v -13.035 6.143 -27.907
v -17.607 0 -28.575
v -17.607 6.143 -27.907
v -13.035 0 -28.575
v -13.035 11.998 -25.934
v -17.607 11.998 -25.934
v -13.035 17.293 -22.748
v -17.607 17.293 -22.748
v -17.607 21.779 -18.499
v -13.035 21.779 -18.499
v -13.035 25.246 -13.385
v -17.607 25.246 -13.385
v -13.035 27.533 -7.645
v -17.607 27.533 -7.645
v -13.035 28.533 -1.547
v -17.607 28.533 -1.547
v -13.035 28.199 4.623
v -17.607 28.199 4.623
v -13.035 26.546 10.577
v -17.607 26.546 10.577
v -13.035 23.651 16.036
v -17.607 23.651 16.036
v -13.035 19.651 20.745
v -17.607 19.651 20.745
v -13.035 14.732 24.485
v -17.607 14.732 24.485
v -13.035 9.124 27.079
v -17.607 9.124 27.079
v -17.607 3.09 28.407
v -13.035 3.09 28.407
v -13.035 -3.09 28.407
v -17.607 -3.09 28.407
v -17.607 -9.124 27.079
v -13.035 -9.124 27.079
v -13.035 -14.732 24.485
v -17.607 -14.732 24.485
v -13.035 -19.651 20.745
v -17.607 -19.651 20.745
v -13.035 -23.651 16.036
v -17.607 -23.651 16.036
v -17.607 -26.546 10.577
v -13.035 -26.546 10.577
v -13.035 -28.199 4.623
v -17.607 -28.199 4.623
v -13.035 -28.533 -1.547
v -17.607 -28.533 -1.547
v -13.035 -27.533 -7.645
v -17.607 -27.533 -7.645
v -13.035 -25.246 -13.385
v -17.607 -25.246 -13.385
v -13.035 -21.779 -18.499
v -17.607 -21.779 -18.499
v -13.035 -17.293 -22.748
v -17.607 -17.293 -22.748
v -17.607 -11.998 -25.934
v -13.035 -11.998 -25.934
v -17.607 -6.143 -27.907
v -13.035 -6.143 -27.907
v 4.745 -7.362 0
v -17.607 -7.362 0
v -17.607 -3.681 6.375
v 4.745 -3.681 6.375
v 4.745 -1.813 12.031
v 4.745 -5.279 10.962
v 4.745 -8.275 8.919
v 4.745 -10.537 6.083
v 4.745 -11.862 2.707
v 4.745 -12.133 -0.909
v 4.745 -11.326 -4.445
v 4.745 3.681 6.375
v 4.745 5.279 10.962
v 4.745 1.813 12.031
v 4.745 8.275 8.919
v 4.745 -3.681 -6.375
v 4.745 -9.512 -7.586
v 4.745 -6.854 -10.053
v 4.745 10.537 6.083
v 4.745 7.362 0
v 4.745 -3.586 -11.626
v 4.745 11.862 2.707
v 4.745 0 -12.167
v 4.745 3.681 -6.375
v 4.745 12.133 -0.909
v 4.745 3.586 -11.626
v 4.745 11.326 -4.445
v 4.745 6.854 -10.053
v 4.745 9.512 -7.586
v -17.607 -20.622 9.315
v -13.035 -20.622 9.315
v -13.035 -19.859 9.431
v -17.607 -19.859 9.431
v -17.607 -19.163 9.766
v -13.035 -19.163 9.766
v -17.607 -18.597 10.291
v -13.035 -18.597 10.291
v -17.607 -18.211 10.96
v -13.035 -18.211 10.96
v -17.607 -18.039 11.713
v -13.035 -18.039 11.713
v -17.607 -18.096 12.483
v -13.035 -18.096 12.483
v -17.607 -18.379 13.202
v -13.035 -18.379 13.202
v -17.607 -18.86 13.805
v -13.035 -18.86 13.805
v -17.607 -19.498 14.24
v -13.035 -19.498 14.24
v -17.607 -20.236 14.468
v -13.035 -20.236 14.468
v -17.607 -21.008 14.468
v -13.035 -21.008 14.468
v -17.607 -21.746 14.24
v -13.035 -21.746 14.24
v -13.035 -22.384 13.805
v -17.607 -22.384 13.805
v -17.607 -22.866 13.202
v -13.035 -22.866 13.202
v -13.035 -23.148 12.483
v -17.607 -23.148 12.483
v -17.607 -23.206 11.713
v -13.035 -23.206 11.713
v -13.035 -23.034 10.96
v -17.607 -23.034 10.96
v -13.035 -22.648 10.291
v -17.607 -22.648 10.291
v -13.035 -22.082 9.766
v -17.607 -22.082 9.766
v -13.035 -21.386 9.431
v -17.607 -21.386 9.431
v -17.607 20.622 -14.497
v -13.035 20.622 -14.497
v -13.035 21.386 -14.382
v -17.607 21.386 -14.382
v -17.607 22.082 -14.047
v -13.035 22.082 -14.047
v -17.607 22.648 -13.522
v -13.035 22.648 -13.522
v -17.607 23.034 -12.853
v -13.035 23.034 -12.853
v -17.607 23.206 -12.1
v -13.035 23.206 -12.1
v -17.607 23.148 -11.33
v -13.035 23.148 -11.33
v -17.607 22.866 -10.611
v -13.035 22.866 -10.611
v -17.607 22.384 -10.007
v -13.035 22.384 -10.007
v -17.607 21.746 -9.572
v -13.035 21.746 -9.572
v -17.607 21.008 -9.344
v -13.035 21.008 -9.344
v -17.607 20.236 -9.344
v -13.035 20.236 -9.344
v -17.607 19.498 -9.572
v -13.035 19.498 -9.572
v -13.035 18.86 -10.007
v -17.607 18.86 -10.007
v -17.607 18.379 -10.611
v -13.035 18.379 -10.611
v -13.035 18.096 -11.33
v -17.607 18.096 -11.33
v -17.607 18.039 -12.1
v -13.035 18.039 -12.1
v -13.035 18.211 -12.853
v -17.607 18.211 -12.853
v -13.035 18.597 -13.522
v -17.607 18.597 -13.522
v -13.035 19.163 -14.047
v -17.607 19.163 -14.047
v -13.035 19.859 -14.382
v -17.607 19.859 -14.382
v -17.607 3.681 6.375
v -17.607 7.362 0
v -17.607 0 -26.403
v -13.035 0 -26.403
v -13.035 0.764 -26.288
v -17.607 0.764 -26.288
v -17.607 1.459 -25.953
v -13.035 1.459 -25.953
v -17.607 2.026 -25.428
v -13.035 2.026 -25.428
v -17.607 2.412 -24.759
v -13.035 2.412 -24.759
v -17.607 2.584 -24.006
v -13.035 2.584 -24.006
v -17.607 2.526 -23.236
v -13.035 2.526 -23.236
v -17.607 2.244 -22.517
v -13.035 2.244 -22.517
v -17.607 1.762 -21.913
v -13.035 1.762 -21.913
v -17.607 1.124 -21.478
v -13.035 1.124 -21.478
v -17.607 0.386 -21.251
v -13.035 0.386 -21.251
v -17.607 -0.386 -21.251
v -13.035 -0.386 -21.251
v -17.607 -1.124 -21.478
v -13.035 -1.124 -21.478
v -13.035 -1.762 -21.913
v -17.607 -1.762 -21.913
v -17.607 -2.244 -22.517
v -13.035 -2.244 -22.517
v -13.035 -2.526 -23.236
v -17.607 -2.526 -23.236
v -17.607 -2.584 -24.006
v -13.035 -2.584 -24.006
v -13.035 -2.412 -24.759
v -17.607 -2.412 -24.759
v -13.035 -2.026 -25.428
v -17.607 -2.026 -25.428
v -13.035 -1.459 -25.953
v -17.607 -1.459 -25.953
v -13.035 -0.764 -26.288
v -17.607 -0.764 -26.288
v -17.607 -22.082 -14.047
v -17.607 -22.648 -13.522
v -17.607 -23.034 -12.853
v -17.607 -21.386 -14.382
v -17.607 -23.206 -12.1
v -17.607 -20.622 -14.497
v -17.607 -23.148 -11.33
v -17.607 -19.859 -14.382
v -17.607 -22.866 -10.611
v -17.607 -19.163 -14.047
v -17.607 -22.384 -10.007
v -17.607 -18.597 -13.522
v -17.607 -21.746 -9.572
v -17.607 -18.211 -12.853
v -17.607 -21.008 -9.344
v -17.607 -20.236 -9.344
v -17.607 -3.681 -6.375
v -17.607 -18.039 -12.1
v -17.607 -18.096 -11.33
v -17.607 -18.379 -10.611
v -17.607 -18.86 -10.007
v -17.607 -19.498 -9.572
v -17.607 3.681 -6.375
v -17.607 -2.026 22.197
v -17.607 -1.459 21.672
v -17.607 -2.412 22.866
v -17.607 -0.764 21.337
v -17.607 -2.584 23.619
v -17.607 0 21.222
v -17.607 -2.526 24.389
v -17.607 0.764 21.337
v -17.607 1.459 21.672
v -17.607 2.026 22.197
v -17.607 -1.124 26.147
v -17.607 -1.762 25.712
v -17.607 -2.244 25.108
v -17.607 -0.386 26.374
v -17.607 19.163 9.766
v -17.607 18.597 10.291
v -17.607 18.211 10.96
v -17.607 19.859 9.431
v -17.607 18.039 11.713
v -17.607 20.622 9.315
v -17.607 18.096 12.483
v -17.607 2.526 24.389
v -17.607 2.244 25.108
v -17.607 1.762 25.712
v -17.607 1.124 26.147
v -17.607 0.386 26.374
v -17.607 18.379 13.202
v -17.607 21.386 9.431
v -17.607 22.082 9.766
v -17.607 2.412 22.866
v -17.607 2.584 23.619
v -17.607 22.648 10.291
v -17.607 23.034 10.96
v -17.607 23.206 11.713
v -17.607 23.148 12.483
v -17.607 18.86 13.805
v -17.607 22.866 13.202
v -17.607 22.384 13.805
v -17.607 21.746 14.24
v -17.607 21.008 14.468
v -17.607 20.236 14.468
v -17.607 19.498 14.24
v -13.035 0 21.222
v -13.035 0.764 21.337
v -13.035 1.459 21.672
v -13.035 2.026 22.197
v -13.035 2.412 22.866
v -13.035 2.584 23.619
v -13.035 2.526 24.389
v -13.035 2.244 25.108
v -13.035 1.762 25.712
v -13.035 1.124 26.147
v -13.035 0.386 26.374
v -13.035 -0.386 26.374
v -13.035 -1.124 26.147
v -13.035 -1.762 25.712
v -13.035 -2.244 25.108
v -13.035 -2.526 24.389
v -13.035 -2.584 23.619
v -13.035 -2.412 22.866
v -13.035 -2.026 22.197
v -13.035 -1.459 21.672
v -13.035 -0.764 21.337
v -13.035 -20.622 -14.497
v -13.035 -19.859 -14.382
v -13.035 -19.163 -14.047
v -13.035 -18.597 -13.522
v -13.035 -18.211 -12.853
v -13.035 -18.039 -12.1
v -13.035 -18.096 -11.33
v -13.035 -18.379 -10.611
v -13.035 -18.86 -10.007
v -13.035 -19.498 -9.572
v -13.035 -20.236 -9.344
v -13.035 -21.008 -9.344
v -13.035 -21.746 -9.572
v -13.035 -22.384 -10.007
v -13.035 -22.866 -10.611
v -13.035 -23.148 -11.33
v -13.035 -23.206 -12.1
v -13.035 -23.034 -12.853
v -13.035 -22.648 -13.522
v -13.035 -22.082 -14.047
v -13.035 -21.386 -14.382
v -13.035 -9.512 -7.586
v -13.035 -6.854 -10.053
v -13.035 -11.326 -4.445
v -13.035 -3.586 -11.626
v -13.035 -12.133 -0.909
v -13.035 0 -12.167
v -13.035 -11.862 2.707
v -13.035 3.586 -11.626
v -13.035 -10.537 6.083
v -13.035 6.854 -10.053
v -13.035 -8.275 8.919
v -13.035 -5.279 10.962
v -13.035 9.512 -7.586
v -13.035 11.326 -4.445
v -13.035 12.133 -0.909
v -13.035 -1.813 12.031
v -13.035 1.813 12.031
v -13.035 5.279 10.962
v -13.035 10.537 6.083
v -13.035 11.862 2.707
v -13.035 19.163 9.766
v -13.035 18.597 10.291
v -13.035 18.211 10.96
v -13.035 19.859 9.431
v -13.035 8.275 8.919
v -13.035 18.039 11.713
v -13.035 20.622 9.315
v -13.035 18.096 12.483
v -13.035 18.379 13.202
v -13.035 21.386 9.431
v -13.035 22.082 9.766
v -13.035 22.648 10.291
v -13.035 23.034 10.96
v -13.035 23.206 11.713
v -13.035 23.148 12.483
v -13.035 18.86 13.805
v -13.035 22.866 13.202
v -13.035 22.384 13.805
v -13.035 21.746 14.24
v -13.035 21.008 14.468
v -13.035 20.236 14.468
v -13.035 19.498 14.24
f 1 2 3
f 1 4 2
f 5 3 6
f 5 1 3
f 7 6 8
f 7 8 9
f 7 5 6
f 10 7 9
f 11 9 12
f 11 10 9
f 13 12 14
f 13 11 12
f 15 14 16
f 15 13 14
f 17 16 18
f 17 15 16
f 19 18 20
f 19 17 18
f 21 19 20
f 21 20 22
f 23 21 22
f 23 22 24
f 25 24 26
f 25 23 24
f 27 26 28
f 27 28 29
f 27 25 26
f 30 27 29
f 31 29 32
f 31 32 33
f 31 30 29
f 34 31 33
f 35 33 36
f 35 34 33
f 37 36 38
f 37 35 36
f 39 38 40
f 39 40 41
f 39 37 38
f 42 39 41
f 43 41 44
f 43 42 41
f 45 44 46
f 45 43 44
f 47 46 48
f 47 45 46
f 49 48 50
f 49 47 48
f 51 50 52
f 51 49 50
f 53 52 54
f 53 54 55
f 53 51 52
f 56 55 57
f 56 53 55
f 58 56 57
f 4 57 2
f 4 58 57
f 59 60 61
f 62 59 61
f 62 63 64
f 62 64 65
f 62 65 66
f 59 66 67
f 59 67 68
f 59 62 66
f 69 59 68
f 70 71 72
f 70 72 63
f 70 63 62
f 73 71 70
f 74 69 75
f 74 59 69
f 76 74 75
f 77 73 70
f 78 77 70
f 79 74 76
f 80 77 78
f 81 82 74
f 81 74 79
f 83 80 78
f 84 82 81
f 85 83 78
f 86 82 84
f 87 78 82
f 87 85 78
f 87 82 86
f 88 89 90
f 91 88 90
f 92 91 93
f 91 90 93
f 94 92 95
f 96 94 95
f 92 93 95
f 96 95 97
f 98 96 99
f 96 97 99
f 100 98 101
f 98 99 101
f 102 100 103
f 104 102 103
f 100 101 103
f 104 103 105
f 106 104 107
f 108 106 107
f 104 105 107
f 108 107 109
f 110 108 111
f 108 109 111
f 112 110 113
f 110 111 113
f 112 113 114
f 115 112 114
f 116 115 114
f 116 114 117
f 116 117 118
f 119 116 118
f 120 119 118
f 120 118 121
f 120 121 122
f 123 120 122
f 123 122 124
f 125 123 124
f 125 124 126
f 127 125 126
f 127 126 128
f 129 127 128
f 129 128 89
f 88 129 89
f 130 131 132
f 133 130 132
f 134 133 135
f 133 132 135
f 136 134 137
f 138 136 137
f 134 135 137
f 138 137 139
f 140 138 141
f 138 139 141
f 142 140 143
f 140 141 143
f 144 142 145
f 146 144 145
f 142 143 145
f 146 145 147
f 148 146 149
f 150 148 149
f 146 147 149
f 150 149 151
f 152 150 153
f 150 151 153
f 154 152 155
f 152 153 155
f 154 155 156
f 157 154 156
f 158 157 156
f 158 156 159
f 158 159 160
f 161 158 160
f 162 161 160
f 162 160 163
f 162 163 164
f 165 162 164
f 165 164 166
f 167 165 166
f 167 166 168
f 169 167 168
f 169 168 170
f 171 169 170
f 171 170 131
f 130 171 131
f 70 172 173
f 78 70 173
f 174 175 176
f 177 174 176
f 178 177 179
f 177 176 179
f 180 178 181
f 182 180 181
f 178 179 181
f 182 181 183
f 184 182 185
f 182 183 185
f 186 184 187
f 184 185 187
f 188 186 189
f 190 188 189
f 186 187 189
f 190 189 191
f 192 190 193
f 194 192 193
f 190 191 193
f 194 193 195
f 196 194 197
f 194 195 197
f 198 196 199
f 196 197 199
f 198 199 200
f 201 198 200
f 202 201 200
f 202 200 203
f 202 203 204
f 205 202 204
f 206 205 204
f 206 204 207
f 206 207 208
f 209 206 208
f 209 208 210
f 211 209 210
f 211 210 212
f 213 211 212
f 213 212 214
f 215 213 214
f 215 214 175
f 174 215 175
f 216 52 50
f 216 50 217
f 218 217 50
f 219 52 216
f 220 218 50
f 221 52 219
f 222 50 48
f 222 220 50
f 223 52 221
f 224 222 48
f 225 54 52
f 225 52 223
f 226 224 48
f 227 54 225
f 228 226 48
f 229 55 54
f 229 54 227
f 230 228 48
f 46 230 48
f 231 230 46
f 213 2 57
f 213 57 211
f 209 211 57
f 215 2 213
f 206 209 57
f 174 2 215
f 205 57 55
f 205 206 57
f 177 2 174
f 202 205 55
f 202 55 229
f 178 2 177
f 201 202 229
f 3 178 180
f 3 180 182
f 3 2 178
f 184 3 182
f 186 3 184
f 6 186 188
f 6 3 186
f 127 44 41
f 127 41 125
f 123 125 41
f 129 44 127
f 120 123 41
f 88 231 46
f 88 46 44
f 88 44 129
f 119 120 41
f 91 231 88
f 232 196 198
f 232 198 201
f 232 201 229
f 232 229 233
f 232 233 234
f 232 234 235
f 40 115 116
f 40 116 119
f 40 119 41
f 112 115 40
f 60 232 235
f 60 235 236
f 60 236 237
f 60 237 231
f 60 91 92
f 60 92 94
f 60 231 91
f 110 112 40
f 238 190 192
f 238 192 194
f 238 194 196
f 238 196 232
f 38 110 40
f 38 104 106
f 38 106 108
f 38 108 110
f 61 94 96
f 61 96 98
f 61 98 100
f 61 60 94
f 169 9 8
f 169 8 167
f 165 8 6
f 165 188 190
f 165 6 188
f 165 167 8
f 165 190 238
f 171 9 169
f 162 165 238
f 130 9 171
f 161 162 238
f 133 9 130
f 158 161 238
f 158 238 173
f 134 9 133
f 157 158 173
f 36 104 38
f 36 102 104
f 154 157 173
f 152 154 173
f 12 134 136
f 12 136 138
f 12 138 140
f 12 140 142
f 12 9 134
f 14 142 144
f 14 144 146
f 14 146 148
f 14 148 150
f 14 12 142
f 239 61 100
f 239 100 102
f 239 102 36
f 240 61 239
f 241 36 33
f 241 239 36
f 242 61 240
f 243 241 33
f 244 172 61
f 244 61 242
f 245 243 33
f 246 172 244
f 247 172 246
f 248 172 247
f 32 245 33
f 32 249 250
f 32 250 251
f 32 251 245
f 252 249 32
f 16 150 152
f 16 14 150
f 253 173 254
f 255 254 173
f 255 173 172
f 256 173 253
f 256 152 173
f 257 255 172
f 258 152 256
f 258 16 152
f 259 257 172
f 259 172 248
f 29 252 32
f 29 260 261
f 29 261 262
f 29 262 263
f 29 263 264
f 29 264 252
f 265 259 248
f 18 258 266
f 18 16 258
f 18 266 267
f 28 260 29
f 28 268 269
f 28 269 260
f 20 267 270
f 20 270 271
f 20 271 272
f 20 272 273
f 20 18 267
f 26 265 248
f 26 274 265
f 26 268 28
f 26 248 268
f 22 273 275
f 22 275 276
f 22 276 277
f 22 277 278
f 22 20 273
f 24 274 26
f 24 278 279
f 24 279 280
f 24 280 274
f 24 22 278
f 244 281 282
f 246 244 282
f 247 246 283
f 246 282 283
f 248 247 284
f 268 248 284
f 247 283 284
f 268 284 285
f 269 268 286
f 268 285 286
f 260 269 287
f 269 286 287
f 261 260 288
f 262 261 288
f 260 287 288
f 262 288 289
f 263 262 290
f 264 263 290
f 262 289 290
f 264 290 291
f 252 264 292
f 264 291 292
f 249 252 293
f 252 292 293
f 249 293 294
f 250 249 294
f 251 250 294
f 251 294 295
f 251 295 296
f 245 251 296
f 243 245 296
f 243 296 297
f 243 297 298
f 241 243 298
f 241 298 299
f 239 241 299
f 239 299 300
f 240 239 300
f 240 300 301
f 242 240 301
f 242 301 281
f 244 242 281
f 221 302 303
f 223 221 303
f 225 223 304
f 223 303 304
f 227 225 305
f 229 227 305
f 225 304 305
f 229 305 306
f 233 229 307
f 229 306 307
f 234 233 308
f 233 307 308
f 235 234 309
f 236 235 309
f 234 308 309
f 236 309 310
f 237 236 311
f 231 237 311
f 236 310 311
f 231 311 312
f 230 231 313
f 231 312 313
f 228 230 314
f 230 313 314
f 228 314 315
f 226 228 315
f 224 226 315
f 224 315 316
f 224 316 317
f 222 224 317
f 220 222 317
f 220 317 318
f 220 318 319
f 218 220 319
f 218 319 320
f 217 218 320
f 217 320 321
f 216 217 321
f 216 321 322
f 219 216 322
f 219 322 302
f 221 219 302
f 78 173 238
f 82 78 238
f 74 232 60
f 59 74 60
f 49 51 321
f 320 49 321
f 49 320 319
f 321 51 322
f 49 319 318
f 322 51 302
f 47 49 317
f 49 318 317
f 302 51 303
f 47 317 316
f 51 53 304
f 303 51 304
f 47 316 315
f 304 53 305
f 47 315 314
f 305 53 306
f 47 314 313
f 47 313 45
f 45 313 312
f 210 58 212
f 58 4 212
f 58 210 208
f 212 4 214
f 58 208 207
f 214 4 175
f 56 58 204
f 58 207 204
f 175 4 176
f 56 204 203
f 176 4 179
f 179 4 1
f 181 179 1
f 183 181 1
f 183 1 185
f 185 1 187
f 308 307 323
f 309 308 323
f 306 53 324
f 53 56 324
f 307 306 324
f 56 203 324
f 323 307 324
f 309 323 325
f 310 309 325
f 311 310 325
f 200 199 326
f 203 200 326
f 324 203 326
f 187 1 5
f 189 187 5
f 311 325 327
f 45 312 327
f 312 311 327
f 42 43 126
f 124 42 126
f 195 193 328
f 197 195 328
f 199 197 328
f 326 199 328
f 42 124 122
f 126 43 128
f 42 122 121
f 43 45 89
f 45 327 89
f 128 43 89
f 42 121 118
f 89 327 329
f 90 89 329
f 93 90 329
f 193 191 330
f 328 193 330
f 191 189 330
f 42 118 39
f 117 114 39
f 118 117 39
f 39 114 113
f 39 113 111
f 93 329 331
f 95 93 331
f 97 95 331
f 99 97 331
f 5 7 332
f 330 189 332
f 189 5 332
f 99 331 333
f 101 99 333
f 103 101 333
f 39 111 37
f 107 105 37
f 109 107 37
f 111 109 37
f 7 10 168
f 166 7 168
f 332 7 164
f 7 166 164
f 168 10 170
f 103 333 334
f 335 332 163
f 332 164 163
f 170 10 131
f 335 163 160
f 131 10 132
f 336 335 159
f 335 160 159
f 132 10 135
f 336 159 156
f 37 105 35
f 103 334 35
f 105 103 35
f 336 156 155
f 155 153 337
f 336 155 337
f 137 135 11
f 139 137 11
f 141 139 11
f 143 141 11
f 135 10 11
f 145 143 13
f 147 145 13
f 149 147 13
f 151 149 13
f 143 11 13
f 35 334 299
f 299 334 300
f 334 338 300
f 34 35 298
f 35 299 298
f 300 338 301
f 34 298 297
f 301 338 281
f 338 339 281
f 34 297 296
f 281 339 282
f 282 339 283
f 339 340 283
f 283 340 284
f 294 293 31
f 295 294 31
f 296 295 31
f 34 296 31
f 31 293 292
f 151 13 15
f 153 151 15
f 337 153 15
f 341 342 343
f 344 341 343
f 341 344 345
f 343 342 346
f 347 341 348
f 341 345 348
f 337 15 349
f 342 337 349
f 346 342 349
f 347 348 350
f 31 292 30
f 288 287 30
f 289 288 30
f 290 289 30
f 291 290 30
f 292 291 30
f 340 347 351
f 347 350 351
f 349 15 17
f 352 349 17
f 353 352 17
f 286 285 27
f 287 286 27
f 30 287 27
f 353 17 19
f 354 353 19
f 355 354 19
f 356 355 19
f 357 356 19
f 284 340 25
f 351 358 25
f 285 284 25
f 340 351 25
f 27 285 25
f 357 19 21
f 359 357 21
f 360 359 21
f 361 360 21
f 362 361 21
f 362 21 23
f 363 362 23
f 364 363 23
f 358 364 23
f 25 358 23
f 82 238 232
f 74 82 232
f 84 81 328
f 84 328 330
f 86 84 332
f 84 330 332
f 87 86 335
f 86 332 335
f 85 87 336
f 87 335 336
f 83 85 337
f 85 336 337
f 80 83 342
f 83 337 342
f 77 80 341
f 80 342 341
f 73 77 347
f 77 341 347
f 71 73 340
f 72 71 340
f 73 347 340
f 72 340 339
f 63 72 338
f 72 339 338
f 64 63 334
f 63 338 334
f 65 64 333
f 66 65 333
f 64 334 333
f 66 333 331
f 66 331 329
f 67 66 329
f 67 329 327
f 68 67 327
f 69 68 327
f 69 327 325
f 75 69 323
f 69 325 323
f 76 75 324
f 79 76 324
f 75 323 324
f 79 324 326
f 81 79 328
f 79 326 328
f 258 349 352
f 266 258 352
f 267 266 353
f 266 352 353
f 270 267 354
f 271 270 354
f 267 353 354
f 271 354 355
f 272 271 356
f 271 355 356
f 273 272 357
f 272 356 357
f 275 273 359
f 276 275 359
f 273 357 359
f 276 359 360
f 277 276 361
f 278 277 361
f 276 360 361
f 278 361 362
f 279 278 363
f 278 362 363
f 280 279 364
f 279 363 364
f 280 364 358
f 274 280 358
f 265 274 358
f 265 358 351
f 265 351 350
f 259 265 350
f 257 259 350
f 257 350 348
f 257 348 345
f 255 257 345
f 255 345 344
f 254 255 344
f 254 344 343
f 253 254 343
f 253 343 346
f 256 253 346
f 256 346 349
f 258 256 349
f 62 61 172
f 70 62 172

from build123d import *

# Parameters (mm, degrees)
SKETCH1_W           = 4.572
SKETCH1_H           = 28.575
SKETCH2_R           = 12.1666
BOSS_EXTRUDE1_DEPTH = 17.78
CUT_EXTRUDE1_DEPTH  = 47.180874331
HOLE1_D             = 5.1816
HOLE1_DEPTH         = 22.352


with BuildPart() as part:
    # Sketch1 → Revolve1 (revolve)
    with BuildSketch(Plane.XY, mode=Mode.PRIVATE) as revolve1_sk:
        with Locations((-15.321066246, 14.2875)):
            Rectangle(SKETCH1_W, SKETCH1_H)
    revolve(revolve1_sk.sketch.rotate(Axis((-17.607066246, 0, 0), (1, 0, 0)), 270), axis=Axis((-17.607066246, 0, 0), (1, 0, 0)))

    # Sketch2 → Boss-Extrude1 (add)
    with BuildSketch(Plane(origin=(-13.035066246, 0, 0), x_dir=(0, 0, -1), z_dir=(1, 0, 0))):
        Circle(SKETCH2_R)
    extrude(amount=BOSS_EXTRUDE1_DEPTH)

    # Sketch3 → Cut-Extrude1 (cut, through all)
    with BuildSketch(Plane.ZY.offset(17.607066246)):
        Polygon((0, -7.361697812), (6.3754, -3.680858906), (6.3754, 3.680818906), (0, 7.361657812), (-6.3754, 3.680818906), (-6.3754, -3.680858906), align=None)
    extrude(amount=-CUT_EXTRUDE1_DEPTH, mode=Mode.SUBTRACT)

    # Hole1
    with Locations(Plane.ZY.offset(17.607066246)):
        with Locations((11.90625, -20.622229928), (-11.90625, -20.622229928), (-23.8125, 0), (-11.90625, 20.622229928), (11.90625, 20.622229928), (23.8125, 0)):
            Hole(HOLE1_D / 2, depth=HOLE1_DEPTH)


solid = part.part
